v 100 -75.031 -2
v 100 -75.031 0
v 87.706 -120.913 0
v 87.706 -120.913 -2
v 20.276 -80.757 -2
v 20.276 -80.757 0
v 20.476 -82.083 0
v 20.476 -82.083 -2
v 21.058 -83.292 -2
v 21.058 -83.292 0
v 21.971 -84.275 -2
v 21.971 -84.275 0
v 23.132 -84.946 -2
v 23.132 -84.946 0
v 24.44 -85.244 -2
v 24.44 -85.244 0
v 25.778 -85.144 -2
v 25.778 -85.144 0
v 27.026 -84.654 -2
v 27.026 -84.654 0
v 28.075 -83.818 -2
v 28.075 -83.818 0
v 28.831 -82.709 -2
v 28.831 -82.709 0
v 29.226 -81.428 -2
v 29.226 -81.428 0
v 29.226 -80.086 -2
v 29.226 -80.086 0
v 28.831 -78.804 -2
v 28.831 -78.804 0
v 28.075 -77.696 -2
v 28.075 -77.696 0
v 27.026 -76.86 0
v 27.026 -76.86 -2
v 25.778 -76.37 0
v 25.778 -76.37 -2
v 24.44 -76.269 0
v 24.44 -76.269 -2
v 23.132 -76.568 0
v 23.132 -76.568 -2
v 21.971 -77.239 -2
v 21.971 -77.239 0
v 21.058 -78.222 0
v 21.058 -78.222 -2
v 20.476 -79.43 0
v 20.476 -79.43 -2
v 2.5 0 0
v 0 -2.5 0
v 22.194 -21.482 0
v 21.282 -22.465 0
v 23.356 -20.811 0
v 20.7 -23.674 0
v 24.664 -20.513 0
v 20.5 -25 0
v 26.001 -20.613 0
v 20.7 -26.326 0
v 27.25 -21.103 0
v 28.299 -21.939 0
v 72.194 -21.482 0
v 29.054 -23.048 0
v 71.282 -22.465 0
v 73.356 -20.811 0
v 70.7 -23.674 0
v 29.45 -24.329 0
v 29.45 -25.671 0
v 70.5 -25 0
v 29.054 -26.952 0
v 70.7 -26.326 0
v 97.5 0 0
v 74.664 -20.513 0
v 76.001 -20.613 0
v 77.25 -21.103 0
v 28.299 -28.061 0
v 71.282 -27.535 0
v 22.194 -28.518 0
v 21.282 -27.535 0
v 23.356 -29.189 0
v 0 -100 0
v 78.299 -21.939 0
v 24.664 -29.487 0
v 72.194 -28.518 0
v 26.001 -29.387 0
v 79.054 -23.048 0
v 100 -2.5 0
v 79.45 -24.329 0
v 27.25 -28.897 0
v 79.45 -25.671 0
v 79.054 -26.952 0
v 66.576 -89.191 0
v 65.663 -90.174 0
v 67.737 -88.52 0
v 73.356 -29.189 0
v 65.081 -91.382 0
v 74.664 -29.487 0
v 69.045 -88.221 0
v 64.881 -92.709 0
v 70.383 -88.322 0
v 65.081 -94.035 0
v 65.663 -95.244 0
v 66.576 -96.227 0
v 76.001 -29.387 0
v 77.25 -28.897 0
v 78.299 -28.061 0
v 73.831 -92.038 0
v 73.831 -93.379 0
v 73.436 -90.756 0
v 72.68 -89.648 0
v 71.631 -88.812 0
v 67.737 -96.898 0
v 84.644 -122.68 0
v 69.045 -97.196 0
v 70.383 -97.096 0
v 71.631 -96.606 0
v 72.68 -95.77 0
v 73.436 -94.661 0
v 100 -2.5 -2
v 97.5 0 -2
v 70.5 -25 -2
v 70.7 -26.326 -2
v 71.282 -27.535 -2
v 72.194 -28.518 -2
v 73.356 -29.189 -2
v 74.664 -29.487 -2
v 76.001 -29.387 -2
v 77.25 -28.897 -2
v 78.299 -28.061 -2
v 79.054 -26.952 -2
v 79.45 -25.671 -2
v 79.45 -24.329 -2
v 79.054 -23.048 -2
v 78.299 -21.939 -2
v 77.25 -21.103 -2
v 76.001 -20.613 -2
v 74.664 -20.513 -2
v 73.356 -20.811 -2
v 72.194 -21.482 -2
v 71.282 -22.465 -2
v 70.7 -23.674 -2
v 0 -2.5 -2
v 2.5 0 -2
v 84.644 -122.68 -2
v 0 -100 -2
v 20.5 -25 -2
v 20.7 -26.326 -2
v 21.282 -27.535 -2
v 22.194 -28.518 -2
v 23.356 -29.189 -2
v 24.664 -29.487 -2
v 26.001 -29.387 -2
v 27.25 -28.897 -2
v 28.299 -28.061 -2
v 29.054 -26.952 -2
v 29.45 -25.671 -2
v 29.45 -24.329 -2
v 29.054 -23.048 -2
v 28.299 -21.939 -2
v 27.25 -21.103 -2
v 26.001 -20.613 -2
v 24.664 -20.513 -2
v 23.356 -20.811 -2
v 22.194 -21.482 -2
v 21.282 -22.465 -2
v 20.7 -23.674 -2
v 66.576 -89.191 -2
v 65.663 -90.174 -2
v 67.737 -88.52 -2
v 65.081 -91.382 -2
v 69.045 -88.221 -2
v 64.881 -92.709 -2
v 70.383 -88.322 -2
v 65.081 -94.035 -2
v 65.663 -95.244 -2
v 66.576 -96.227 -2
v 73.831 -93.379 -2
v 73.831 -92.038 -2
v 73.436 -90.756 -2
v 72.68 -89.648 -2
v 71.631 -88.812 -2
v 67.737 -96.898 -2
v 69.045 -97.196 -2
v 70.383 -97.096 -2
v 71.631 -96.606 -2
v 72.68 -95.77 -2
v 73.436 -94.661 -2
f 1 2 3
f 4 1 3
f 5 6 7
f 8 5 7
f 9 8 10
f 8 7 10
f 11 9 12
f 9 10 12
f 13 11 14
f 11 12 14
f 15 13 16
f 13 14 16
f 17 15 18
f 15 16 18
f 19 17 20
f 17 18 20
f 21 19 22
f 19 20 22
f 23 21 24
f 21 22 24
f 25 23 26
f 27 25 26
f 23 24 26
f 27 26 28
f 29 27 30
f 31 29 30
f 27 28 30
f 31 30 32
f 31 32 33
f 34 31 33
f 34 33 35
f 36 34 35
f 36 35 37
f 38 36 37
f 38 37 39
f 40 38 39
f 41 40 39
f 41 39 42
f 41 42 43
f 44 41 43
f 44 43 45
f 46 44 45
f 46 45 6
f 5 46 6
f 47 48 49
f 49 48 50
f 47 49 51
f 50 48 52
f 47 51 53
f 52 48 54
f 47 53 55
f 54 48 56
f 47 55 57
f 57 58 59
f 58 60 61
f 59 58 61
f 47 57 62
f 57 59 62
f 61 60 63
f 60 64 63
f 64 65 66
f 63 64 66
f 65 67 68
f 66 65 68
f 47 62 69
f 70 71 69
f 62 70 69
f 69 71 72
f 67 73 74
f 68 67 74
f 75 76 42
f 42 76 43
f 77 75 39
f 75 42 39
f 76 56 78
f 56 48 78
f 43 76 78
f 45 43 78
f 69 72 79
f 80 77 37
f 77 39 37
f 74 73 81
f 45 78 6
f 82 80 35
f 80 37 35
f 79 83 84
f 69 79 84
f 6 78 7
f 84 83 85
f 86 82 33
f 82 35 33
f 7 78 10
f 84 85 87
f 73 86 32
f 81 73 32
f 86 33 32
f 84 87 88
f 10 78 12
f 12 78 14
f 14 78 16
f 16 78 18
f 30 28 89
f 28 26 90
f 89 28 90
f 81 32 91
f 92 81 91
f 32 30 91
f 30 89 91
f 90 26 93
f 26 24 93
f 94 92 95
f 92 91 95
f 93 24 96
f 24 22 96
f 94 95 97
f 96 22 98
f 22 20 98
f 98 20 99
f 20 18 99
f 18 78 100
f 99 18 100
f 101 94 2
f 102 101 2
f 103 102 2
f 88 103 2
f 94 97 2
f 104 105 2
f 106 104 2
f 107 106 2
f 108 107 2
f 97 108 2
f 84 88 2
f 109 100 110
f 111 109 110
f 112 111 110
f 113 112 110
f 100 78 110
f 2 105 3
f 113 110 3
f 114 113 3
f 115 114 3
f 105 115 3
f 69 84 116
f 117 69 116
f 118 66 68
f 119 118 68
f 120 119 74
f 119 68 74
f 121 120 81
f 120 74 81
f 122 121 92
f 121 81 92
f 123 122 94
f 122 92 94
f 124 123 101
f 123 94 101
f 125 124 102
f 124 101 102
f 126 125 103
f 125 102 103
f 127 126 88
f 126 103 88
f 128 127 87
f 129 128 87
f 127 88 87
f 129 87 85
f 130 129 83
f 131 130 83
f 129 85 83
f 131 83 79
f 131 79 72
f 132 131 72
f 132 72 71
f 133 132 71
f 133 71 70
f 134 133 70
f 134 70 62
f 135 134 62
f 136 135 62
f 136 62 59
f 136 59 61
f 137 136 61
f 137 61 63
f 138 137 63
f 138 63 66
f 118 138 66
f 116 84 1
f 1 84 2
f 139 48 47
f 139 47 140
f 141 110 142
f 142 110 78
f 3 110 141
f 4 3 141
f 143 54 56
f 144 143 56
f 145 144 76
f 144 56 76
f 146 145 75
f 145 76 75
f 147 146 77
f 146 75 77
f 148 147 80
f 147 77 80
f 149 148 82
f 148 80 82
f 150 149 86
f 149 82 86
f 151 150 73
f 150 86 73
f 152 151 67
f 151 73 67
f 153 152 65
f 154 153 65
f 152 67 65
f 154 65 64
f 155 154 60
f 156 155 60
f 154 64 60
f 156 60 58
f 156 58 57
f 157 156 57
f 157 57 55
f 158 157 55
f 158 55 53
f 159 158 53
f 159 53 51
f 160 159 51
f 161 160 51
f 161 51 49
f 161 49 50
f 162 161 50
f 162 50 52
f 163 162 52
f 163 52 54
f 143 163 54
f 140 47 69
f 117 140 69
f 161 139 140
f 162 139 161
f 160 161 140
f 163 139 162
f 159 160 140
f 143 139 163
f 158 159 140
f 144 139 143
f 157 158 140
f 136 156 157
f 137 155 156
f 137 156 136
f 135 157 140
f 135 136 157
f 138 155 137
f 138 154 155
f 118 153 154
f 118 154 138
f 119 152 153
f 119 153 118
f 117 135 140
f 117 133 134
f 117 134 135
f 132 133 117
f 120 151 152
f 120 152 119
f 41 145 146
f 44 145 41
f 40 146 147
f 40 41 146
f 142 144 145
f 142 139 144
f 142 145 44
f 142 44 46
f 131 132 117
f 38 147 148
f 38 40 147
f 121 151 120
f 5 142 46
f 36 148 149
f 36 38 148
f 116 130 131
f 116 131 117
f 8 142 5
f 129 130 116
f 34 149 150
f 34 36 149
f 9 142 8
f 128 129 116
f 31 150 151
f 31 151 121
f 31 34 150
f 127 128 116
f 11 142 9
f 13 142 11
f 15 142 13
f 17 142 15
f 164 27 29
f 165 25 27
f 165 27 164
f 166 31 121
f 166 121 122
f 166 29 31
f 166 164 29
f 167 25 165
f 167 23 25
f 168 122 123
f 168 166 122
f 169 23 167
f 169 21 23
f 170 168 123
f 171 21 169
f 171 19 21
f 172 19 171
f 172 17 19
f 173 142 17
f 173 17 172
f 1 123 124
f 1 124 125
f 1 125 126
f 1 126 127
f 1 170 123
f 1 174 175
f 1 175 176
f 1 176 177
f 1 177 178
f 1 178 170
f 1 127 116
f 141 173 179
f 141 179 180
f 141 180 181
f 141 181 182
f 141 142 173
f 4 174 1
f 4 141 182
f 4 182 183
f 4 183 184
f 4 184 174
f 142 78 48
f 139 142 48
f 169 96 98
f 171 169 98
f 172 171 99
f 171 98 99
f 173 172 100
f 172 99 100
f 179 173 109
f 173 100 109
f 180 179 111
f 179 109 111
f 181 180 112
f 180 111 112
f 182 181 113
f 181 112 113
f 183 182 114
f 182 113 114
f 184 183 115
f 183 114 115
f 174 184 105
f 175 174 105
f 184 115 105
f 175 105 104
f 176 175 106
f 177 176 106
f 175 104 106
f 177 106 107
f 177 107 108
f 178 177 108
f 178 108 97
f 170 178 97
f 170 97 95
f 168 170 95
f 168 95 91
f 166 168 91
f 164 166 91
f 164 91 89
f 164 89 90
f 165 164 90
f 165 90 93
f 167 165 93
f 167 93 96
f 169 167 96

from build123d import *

# Parameters (mm, degrees)
EXTRUDE_1_DEPTH   = 2
HOLE_WIZARD_M81_D = 9
CHAMFER_1_SIZE    = 2.5


with BuildPart() as part:
    # Эскиз3 → Бобышка-Вытянуть1 (new body)
    with BuildSketch(Plane(origin=(0, 0, 0), x_dir=(1, 0, 0), z_dir=(0, 0, -1))):
        Polygon((0, 0), (100, 0), (100, 75.031110223), (87.059047745, 123.327401537), (0, 100), align=None)
    extrude(amount=EXTRUDE_1_DEPTH)

    # Отверстие с зазором M81 (through all)
    with Locations(Plane(origin=(0, 0, -2), x_dir=(1, 0, 0), z_dir=(0, 0, -1))):
        with Locations((75, 25), (24.776246401, 80.756870704), (69.381378215, 92.708779752), (25, 25)):
            Hole(HOLE_WIZARD_M81_D / 2)

    # Фаска1
    chamfer_1_edges = [part.edges().sort_by_distance(p)[0] for p in [
        (87.059047745, -123.327401537, -1),
        (100, 0, -1),
        (0, 0, -1),
    ]]
    chamfer(chamfer_1_edges, length=CHAMFER_1_SIZE)


solid = part.part
